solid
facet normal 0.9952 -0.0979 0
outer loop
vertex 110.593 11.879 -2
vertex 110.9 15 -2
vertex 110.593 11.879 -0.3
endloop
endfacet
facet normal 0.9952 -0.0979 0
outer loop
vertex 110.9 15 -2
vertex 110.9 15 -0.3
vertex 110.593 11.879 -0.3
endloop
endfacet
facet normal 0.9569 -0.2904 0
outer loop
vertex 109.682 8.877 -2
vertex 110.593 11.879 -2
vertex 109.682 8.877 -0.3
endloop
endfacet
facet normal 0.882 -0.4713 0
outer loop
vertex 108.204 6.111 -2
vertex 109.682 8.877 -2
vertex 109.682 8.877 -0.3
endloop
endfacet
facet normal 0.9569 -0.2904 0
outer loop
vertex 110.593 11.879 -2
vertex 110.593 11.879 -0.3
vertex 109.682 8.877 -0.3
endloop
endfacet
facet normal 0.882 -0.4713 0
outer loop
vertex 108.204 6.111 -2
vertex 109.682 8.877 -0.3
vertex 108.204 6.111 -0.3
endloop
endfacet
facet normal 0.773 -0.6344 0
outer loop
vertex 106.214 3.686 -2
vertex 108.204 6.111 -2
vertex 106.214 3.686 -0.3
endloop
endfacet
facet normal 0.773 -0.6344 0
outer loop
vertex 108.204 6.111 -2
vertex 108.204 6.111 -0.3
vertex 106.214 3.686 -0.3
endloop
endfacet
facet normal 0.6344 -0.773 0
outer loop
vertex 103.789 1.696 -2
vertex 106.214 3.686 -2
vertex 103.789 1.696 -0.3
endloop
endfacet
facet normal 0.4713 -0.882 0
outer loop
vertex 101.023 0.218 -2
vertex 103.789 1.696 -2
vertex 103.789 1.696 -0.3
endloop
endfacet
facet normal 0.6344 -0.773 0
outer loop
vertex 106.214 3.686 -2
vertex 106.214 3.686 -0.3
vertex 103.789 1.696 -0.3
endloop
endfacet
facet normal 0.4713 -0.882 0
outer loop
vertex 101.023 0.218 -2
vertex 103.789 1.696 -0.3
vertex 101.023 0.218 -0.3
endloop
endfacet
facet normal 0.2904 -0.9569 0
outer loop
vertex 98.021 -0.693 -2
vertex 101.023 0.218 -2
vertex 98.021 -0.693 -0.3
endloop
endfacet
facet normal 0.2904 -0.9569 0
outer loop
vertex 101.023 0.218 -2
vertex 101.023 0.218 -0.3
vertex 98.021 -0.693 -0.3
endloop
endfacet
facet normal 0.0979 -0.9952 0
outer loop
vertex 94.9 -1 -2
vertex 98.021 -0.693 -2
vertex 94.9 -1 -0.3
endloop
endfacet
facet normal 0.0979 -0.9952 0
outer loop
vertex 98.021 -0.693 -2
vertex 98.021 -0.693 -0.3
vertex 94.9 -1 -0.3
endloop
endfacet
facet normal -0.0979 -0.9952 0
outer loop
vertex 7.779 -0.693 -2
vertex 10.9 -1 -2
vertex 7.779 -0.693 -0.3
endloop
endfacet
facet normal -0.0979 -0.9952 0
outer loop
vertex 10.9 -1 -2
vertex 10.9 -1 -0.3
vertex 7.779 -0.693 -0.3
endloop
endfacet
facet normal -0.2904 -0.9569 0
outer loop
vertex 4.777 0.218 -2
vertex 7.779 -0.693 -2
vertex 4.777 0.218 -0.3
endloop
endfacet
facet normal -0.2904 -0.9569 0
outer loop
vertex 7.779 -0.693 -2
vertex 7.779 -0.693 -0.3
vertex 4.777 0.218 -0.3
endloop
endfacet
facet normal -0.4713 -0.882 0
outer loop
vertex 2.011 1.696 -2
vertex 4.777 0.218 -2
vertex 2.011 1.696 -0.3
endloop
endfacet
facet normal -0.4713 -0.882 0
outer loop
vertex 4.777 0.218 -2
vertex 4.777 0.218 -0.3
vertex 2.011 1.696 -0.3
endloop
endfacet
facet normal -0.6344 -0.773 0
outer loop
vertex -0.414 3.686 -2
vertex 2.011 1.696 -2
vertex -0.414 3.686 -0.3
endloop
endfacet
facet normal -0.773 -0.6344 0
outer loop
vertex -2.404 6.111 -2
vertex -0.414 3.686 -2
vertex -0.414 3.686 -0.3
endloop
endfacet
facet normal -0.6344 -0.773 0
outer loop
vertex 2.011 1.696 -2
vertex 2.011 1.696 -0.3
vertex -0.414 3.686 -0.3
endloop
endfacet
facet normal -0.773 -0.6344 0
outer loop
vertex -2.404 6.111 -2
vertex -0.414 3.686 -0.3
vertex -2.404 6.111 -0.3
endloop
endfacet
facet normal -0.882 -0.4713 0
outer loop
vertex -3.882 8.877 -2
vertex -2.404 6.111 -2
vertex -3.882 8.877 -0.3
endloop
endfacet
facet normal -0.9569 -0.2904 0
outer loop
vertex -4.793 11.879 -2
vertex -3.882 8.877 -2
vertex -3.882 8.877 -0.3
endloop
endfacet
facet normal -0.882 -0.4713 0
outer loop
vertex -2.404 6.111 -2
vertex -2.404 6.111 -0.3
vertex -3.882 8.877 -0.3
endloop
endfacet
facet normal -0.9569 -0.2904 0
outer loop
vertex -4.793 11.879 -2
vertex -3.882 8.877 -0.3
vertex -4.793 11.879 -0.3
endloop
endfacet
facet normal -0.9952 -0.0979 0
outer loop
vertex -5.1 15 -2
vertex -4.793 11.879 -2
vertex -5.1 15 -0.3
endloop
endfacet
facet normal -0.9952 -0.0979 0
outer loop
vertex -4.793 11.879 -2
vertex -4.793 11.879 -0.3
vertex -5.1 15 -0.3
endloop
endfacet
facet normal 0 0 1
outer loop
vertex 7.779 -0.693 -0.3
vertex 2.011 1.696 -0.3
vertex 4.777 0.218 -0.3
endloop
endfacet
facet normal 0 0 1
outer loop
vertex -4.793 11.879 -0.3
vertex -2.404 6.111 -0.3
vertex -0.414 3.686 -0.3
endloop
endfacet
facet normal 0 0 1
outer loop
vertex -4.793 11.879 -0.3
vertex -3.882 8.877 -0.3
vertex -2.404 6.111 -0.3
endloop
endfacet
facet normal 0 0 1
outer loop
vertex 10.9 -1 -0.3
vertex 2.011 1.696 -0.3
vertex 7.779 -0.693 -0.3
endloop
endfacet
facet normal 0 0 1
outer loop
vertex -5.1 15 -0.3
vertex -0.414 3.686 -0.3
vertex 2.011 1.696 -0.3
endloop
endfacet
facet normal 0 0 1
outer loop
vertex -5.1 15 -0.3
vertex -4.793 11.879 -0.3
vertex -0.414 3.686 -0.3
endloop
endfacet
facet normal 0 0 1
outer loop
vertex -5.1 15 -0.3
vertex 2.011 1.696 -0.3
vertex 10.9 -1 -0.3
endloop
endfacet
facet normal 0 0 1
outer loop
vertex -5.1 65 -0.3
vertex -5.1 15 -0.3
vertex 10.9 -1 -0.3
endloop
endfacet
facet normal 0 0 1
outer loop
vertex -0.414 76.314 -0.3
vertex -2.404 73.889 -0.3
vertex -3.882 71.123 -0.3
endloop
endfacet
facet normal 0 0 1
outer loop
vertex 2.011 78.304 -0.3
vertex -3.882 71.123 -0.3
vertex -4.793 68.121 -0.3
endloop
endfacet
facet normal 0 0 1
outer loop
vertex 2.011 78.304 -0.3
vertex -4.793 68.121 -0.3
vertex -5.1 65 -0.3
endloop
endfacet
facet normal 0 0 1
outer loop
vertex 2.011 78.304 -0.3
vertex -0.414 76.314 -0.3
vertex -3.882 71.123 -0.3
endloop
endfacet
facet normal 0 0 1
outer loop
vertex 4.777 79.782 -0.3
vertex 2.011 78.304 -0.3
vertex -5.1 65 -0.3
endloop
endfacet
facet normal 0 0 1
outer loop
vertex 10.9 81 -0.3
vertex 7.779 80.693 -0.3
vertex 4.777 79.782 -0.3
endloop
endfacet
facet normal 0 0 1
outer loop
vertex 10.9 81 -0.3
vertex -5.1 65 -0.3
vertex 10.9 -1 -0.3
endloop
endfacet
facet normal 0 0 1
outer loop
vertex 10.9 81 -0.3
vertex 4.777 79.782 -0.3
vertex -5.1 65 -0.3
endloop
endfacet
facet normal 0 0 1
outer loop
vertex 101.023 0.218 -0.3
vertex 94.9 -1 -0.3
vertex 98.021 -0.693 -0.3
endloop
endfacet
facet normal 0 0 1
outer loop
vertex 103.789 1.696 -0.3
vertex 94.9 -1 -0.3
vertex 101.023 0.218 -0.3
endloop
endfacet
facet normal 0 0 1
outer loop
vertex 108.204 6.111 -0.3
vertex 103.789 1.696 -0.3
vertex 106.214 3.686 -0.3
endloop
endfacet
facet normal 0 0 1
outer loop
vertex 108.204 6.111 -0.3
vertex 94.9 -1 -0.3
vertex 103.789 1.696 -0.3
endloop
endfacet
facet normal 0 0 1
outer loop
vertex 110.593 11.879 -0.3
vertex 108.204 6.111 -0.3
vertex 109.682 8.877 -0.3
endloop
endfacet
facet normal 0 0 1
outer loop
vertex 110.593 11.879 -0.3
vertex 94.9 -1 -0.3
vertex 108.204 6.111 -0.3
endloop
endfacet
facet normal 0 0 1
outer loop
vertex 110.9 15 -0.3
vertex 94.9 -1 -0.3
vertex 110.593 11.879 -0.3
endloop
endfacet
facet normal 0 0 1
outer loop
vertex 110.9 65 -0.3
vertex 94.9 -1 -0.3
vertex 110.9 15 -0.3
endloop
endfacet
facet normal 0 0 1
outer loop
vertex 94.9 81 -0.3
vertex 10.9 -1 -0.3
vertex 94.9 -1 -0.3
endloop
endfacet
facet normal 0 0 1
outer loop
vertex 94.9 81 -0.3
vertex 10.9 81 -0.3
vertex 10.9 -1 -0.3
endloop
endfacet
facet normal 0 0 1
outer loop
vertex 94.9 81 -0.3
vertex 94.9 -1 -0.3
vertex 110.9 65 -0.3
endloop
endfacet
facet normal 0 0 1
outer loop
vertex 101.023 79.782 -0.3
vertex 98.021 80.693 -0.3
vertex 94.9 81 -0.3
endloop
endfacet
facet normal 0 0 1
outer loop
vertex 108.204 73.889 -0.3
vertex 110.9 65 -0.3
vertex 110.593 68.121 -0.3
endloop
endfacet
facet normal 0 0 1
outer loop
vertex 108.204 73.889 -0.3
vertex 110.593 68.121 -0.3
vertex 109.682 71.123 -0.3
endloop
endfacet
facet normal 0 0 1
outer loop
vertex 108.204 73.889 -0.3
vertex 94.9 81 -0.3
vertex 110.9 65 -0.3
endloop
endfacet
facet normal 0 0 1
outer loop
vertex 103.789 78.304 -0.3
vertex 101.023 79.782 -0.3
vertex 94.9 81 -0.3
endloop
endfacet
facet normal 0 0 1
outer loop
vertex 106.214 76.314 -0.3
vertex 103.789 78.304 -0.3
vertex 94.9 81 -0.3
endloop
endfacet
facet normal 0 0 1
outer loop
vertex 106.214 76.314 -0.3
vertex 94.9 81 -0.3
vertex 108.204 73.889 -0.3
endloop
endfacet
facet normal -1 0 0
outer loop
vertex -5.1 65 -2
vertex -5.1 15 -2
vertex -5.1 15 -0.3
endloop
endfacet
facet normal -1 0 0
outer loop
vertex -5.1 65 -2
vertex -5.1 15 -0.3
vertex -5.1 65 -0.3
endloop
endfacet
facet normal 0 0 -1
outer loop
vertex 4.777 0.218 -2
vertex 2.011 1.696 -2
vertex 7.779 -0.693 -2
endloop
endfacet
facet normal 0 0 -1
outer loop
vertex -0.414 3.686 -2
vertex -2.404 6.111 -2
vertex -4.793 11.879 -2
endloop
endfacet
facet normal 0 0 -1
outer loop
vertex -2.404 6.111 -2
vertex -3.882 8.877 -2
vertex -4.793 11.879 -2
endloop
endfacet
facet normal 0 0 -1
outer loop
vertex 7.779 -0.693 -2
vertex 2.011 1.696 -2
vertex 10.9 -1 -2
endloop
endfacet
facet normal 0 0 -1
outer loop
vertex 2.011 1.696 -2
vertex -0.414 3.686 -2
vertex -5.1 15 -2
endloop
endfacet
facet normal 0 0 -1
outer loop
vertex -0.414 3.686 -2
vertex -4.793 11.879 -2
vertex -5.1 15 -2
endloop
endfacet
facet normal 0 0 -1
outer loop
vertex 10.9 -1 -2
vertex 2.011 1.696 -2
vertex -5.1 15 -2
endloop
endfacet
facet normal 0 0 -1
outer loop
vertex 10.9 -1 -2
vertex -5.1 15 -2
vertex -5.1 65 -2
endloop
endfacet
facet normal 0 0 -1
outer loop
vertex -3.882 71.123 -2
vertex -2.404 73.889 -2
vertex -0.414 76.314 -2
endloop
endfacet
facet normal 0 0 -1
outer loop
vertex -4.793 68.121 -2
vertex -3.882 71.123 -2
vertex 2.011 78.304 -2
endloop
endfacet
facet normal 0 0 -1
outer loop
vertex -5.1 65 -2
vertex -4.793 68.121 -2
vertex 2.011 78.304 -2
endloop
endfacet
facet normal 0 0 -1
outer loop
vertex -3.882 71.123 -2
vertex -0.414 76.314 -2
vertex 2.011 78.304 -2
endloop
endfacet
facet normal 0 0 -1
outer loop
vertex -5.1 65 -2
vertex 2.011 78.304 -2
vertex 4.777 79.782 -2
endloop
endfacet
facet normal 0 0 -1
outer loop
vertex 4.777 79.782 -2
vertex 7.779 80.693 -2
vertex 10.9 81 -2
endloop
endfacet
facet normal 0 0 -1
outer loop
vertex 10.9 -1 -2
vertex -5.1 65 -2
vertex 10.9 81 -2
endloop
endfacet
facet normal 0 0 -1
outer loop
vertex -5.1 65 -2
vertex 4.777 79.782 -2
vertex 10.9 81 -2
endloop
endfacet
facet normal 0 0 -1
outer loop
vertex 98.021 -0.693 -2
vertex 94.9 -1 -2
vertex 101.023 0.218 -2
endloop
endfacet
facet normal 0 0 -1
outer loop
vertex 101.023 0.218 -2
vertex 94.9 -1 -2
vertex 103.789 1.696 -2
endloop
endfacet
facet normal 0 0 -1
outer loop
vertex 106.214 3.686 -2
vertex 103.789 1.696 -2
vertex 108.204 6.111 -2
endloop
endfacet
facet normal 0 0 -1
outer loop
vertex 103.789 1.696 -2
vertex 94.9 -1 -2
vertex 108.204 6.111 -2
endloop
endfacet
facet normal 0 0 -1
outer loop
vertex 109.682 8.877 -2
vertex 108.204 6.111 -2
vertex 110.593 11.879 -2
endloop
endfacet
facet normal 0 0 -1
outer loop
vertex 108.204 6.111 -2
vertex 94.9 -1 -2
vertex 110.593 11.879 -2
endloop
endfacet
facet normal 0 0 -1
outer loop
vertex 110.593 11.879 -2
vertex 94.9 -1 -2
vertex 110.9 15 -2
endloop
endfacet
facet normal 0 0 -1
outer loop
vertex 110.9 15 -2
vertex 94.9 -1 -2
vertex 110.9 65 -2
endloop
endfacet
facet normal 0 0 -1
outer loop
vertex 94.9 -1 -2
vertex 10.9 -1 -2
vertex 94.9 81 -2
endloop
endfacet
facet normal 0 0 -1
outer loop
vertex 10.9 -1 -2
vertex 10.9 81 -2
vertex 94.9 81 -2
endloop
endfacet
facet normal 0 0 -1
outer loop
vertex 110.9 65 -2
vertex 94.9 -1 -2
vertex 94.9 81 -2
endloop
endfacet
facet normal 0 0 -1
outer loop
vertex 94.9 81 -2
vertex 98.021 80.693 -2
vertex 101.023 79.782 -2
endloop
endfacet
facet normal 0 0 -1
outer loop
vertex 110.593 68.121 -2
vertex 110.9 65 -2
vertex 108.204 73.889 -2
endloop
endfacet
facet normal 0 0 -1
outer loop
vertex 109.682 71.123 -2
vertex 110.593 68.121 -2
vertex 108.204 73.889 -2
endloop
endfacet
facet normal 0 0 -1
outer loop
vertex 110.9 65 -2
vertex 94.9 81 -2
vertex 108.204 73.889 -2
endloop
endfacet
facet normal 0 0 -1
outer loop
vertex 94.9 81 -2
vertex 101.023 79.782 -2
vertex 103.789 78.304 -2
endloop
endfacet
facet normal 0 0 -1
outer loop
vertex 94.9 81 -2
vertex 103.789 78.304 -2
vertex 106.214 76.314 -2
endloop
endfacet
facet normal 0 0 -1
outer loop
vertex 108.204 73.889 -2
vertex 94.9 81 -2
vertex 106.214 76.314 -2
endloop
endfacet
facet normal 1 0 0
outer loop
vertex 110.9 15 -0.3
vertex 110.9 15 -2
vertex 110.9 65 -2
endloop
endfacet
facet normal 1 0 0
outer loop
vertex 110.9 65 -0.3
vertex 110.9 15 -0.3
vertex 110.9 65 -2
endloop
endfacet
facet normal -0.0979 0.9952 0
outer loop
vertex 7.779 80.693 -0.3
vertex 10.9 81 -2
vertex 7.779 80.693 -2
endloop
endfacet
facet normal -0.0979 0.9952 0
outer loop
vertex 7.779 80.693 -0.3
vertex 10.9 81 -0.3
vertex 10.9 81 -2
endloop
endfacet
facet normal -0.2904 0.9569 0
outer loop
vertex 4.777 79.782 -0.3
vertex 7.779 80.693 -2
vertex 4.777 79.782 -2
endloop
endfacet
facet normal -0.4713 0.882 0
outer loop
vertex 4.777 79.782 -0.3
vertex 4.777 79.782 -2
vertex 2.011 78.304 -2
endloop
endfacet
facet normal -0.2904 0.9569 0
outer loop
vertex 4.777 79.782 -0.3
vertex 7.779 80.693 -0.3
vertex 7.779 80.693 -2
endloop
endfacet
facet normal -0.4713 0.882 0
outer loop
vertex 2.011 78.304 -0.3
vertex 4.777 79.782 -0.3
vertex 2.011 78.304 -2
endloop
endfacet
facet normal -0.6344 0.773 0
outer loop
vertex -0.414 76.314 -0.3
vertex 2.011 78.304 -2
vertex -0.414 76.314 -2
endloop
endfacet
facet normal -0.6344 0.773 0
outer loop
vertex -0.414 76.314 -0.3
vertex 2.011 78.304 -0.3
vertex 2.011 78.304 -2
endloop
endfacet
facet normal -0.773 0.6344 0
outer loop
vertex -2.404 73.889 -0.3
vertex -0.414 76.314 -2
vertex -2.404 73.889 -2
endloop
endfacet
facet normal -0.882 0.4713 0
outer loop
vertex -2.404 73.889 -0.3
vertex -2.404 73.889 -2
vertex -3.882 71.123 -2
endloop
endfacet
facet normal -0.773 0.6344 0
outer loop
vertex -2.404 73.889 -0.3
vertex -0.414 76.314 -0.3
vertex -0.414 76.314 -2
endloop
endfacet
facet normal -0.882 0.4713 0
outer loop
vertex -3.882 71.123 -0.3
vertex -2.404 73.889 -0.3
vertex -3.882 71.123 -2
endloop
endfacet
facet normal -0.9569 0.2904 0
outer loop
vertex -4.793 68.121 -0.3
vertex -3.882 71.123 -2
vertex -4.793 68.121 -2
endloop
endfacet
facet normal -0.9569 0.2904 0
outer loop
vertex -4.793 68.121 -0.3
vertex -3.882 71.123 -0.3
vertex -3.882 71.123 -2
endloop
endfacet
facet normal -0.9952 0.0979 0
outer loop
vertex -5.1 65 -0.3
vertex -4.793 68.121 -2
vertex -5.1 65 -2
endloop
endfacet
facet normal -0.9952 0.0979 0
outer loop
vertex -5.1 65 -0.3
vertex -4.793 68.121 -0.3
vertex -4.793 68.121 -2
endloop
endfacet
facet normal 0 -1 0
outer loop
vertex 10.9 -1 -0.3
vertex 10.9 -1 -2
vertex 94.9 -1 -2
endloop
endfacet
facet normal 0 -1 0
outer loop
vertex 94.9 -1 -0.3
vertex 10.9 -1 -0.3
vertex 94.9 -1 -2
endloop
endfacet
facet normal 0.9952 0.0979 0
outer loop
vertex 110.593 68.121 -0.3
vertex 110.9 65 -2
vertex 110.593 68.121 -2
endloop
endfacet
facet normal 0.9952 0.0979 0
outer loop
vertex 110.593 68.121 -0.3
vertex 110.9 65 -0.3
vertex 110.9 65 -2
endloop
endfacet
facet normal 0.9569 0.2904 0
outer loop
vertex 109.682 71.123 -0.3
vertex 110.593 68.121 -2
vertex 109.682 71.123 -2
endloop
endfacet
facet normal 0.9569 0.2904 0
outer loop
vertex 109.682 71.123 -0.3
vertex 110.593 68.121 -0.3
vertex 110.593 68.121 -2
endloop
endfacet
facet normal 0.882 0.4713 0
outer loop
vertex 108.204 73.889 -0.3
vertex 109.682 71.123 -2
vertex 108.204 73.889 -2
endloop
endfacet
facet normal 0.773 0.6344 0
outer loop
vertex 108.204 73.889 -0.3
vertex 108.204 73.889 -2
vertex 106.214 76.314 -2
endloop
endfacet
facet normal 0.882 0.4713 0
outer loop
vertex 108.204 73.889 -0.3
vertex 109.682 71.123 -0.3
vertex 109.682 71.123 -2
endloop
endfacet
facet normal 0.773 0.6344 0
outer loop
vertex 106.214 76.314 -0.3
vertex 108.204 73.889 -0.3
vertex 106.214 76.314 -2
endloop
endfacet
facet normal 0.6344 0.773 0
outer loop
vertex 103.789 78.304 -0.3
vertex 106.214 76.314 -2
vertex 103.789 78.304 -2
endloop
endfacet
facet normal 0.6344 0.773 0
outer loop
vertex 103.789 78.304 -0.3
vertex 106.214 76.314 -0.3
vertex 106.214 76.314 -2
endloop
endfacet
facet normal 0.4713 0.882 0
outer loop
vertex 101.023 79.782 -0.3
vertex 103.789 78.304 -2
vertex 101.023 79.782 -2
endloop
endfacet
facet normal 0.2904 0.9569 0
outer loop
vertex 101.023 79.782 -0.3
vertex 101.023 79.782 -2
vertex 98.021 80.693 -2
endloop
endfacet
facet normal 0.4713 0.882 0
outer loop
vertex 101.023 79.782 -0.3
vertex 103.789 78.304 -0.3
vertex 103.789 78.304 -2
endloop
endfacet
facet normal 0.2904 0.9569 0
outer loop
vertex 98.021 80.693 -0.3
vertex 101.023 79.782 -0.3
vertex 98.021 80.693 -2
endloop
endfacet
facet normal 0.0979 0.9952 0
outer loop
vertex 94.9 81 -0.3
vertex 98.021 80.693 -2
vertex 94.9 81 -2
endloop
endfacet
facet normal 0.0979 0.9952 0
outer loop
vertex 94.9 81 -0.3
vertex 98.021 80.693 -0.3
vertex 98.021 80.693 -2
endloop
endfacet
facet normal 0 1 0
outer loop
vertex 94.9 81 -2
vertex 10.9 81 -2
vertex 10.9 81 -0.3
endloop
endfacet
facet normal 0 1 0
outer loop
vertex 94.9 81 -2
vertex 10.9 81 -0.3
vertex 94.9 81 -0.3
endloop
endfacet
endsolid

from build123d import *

# Parameters (mm, degrees)
BOX020_W     = 116
BOX020_H     = 82
BOX020_DEPTH = 1.7
FILLET_R     = 16
FILLET029_R  = 16


with BuildPart() as part:
    # Box020 → Box020 (new body)
    with BuildSketch(Plane(origin=(-5.1, -1, -12), x_dir=(1, 0, 0), z_dir=(0, 0, 1))):
        with Locations((58, 41)):
            Rectangle(BOX020_W, BOX020_H)
    extrude(amount=BOX020_DEPTH)

    # Fillet
    fillet_edges = [part.edges().sort_by_distance(p)[0] for p in [
        (110.9, 81, -11.15),
    ]]
    fillet(fillet_edges, radius=FILLET_R)

    # Fillet029
    fillet029_edges = [part.edges().sort_by_distance(p)[0] for p in [
        (110.9, -1, -11.15),
        (-5.1, -1, -11.15),
        (-5.1, 81, -11.15),
    ]]
    fillet(fillet029_edges, radius=FILLET029_R)


with BuildPart() as part_1:
    # Fillet029 placement: moved
    add(part.part.moved(Location((0, 0, 10))))


solid = part_1.part
